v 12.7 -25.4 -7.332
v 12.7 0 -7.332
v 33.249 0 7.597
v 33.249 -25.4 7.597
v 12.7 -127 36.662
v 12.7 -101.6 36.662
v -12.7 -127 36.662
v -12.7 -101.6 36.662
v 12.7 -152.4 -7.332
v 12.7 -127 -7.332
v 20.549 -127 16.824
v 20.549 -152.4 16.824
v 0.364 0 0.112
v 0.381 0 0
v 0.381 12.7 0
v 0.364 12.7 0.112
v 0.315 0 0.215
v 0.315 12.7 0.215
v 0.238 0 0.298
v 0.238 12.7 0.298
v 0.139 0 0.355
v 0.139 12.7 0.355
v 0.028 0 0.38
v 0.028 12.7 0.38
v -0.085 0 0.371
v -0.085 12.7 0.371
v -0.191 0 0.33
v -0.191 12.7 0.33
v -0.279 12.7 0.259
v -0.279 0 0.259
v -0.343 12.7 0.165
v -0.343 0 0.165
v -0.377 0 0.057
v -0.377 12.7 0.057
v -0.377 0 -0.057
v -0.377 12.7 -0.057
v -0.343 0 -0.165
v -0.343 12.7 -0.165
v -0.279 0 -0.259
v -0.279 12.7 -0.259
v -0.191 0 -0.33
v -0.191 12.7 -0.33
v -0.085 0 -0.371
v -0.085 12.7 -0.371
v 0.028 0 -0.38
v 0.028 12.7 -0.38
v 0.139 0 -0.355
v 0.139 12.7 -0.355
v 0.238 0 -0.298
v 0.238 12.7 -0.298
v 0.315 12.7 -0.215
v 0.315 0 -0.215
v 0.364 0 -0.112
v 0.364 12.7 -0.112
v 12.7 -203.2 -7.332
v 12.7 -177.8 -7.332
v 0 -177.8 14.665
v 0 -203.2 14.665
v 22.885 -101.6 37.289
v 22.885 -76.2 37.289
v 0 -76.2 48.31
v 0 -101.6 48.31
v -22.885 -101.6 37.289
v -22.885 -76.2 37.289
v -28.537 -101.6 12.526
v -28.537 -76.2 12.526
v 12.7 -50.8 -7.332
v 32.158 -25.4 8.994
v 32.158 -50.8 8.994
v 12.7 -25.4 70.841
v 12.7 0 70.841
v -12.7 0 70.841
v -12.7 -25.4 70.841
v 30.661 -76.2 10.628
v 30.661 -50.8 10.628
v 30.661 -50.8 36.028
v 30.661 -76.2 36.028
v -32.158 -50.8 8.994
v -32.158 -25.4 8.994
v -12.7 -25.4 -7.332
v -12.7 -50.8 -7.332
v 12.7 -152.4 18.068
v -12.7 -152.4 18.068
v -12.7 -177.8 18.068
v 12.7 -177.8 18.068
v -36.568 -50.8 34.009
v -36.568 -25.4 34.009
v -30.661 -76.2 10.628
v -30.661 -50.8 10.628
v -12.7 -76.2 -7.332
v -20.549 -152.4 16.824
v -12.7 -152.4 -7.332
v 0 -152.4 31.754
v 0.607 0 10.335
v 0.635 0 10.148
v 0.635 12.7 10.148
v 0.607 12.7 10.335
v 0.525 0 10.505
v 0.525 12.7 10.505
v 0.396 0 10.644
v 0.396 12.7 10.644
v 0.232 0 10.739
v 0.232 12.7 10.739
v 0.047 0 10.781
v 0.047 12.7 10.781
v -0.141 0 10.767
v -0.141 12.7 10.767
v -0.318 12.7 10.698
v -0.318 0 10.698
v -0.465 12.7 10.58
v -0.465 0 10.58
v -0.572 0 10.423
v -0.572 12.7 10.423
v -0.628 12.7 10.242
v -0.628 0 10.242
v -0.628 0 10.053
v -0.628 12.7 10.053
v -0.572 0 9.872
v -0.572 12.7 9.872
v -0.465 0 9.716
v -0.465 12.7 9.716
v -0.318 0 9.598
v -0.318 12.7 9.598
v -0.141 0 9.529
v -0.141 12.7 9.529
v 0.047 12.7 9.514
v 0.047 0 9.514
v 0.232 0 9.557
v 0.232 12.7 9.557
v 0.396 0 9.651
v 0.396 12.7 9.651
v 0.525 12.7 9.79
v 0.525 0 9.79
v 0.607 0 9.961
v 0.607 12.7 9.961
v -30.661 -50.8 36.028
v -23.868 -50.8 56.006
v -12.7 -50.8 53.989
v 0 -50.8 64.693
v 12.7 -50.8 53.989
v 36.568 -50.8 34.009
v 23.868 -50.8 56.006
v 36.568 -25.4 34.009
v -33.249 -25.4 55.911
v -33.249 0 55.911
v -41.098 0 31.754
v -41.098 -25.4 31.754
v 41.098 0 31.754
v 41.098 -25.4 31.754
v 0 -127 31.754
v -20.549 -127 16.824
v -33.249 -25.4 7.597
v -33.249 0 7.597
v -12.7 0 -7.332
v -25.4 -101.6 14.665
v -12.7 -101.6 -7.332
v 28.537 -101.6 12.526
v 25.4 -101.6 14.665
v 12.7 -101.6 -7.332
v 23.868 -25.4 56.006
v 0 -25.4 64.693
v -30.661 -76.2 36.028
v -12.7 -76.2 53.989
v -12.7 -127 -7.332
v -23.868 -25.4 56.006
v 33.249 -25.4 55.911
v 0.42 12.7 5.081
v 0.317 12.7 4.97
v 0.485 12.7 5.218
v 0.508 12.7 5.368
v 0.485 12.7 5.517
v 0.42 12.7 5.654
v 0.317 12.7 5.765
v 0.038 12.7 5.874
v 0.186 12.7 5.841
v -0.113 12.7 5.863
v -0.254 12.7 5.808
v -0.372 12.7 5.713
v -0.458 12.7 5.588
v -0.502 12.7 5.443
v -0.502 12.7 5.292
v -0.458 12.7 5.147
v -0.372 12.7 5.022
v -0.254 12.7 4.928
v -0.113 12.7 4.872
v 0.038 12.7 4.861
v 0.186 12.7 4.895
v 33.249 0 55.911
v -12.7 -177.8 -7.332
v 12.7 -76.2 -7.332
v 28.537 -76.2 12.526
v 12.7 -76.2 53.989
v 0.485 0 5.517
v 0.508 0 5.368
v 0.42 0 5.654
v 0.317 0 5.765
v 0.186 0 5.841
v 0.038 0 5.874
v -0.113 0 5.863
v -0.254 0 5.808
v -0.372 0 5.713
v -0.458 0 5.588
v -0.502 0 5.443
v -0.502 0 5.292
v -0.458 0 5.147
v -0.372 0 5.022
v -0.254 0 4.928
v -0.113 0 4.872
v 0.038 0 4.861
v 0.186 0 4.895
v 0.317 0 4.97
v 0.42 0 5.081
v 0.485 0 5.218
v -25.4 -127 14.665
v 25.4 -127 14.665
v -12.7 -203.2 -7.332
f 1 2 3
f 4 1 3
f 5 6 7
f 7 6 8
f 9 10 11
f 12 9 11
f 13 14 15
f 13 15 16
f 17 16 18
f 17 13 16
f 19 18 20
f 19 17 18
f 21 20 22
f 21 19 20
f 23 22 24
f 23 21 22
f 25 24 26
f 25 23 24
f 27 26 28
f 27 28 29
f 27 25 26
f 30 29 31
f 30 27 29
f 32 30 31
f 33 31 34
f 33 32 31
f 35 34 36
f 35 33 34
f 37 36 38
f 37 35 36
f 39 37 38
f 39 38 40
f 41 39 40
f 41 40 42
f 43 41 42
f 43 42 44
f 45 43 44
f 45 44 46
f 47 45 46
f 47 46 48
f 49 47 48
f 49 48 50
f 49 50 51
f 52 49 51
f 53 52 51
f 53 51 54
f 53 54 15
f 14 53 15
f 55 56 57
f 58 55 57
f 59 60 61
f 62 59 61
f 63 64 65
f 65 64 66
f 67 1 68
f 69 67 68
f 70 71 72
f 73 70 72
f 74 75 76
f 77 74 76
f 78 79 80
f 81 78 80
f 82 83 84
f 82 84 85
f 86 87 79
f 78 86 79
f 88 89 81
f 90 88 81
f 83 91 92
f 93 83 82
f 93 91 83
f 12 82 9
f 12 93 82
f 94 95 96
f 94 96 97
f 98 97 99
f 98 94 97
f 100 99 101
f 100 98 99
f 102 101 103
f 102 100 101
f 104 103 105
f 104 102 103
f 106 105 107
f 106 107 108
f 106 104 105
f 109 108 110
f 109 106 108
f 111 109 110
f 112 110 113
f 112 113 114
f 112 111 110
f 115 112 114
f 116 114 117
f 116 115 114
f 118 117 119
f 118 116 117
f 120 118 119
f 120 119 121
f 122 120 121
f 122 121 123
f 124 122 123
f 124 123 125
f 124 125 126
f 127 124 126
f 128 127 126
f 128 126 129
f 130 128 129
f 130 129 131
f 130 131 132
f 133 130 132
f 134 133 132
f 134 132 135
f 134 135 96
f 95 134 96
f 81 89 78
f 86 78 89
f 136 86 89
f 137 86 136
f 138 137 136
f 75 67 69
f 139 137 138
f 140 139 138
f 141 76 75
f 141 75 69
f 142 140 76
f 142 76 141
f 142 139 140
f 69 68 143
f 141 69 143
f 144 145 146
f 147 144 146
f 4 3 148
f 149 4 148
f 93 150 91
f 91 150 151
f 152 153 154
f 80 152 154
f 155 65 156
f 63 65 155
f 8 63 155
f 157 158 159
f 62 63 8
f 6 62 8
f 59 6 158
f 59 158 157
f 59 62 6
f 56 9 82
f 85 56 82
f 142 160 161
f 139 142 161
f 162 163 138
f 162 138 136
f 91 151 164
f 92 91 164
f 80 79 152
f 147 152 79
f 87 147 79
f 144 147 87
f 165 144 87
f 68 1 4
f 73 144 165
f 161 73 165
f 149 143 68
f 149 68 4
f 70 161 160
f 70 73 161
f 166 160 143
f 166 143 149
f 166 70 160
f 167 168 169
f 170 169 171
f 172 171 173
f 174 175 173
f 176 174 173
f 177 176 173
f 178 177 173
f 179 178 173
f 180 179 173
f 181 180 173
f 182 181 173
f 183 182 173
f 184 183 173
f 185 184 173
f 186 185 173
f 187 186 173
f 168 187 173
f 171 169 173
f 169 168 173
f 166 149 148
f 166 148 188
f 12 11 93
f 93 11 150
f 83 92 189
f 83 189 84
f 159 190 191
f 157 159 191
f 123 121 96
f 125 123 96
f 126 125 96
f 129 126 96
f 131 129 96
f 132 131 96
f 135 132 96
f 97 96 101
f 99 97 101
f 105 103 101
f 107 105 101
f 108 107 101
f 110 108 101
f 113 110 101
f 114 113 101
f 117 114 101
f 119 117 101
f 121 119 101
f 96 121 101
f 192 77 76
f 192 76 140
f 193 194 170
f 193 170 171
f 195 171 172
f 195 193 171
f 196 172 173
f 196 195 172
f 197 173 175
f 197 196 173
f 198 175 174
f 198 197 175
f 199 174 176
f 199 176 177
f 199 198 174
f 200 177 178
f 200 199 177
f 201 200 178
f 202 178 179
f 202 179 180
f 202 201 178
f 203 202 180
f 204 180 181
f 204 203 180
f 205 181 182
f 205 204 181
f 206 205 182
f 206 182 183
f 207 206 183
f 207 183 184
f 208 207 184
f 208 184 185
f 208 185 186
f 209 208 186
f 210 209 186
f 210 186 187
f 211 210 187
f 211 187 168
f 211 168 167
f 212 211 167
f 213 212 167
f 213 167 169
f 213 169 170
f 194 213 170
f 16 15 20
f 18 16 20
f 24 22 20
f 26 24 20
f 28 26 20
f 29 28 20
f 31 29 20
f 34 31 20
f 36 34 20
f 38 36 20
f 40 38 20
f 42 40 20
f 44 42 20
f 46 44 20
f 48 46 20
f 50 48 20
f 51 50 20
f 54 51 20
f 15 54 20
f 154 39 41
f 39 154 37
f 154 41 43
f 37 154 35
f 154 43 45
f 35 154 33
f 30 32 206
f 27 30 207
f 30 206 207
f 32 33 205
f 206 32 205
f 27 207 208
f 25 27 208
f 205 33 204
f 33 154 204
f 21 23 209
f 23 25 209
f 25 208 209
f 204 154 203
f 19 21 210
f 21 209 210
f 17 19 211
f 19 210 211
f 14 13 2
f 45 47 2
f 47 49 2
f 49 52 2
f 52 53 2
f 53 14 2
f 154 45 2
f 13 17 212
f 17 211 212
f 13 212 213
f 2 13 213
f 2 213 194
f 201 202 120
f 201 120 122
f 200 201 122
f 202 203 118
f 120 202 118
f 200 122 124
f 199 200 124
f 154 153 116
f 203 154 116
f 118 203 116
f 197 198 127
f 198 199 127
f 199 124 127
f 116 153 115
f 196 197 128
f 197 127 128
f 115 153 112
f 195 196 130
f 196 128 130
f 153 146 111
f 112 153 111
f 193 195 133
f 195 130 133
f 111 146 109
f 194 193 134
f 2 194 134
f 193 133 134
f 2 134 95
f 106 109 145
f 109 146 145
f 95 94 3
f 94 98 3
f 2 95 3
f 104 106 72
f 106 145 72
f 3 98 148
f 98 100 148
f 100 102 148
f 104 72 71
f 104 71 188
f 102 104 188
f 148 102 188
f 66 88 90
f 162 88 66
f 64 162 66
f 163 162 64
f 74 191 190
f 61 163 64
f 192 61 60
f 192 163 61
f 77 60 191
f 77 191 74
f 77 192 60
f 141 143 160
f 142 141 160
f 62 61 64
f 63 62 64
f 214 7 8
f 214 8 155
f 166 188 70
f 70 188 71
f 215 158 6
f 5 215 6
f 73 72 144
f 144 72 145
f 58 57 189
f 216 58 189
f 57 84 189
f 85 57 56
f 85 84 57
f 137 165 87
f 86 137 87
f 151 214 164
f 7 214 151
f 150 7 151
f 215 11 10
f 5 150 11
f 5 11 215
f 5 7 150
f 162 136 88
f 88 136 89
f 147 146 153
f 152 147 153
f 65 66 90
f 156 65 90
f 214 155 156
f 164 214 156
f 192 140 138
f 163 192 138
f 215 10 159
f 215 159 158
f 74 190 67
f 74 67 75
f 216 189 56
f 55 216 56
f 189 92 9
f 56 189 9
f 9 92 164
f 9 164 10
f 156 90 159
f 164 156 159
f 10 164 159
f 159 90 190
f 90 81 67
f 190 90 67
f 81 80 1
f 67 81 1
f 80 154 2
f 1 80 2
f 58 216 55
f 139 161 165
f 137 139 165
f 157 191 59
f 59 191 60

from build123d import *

# Parameters (mm, degrees)
F1_DEPTH  = 203.2
F2_W      = 25.4
F2_H      = 25.4
F3_DEPTH  = 177.8
F5_DEPTH  = 152.4
F7_DEPTH  = 127
F9_DEPTH  = 101.6
F11_DEPTH = 76.2
F13_DEPTH = 50.8
F15_DEPTH = 25.4
F16_R     = 0.508
F17_DEPTH = 190.5
F18_R     = 0.381
F19_DEPTH = 215.9
F20_R     = 0.635
F21_DEPTH = 165.1


with BuildPart() as f1:
    # F0 (on Front) → F1 (new body)
    with BuildSketch(Plane.XZ):
        Polygon((-12.7, -7.332348), (12.7, -7.332348), (0, 14.664697), align=None)
    extrude(amount=F1_DEPTH)

    # F2 (on Front) → F3 (join)
    with BuildSketch(Plane.XZ):
        with Locations((0, 5.367652)):
            Rectangle(F2_W, F2_H)
    extrude(amount=F3_DEPTH)

    # F4 (on Front) → F5 (join)
    with BuildSketch(Plane.XZ):
        Polygon((-12.7, -7.332348), (12.7, -7.332348), (20.549032, 16.824487), (0, 31.754233), (-20.549032, 16.824487), align=None)
    extrude(amount=F5_DEPTH)

    # F6 (on Front) → F7 (join)
    with BuildSketch(Plane.XZ):
        Polygon((-12.7, -7.332348), (12.7, -7.332348), (25.4, 14.664697), (12.7, 36.661742), (-12.7, 36.661742), (-25.4, 14.664697), align=None)
    extrude(amount=F7_DEPTH)

    # F8 (on Front) → F9 (join)
    with BuildSketch(Plane.XZ):
        Polygon((-12.7, -7.332348), (12.7, -7.332348), (28.536641, 12.526171), (22.884609, 37.28934), (0, 48.309987), (-22.884609, 37.28934), (-28.536641, 12.526171), align=None)
    extrude(amount=F9_DEPTH)

    # F10 (on Front) → F11 (join)
    with BuildSketch(Plane.XZ):
        Polygon((-12.7, -7.332348), (12.7, -7.332348), (30.660512, 10.628164), (30.660512, 36.028164), (12.7, 53.988676), (-12.7, 53.988676), (-30.660512, 36.028164), (-30.660512, 10.628164), align=None)
    extrude(amount=F11_DEPTH)

    # F12 (on Front) → F13 (join)
    with BuildSketch(Plane.XZ):
        Polygon((-12.7, -7.332348), (12.7, -7.332348), (32.157529, 8.994457), (36.568193, 34.008574), (23.868193, 56.005619), (0, 64.692931), (-23.868193, 56.005619), (-36.568193, 34.008574), (-32.157529, 8.994457), align=None)
    extrude(amount=F13_DEPTH)

    # F14 (on Front) → F15 (join)
    with BuildSketch(Plane.XZ):
        Polygon((-12.7, -7.332348), (12.7, -7.332348), (33.249032, 7.597397), (41.098063, 31.754233), (33.249032, 55.911068), (12.7, 70.840813), (-12.7, 70.840813), (-33.249032, 55.911068), (-41.098063, 31.754233), (-33.249032, 7.597397), align=None)
    extrude(amount=F15_DEPTH)

    # F16 (on face) → F17 (join)
    with BuildSketch(Plane.XZ.offset(177.8)):
        with Locations((0, 5.367652)):
            Circle(F16_R)
    extrude(amount=-F17_DEPTH)

    # F18 (on face) → F19 (join)
    with BuildSketch(Plane.XZ.offset(203.2)):
        Circle(F18_R)
    extrude(amount=-F19_DEPTH)

    # F20 (on face) → F21 (join)
    with BuildSketch(Plane.XZ.offset(152.4)):
        with Locations((0, 10.147702)):
            Circle(F20_R)
    extrude(amount=-F21_DEPTH)


solid = f1.part
